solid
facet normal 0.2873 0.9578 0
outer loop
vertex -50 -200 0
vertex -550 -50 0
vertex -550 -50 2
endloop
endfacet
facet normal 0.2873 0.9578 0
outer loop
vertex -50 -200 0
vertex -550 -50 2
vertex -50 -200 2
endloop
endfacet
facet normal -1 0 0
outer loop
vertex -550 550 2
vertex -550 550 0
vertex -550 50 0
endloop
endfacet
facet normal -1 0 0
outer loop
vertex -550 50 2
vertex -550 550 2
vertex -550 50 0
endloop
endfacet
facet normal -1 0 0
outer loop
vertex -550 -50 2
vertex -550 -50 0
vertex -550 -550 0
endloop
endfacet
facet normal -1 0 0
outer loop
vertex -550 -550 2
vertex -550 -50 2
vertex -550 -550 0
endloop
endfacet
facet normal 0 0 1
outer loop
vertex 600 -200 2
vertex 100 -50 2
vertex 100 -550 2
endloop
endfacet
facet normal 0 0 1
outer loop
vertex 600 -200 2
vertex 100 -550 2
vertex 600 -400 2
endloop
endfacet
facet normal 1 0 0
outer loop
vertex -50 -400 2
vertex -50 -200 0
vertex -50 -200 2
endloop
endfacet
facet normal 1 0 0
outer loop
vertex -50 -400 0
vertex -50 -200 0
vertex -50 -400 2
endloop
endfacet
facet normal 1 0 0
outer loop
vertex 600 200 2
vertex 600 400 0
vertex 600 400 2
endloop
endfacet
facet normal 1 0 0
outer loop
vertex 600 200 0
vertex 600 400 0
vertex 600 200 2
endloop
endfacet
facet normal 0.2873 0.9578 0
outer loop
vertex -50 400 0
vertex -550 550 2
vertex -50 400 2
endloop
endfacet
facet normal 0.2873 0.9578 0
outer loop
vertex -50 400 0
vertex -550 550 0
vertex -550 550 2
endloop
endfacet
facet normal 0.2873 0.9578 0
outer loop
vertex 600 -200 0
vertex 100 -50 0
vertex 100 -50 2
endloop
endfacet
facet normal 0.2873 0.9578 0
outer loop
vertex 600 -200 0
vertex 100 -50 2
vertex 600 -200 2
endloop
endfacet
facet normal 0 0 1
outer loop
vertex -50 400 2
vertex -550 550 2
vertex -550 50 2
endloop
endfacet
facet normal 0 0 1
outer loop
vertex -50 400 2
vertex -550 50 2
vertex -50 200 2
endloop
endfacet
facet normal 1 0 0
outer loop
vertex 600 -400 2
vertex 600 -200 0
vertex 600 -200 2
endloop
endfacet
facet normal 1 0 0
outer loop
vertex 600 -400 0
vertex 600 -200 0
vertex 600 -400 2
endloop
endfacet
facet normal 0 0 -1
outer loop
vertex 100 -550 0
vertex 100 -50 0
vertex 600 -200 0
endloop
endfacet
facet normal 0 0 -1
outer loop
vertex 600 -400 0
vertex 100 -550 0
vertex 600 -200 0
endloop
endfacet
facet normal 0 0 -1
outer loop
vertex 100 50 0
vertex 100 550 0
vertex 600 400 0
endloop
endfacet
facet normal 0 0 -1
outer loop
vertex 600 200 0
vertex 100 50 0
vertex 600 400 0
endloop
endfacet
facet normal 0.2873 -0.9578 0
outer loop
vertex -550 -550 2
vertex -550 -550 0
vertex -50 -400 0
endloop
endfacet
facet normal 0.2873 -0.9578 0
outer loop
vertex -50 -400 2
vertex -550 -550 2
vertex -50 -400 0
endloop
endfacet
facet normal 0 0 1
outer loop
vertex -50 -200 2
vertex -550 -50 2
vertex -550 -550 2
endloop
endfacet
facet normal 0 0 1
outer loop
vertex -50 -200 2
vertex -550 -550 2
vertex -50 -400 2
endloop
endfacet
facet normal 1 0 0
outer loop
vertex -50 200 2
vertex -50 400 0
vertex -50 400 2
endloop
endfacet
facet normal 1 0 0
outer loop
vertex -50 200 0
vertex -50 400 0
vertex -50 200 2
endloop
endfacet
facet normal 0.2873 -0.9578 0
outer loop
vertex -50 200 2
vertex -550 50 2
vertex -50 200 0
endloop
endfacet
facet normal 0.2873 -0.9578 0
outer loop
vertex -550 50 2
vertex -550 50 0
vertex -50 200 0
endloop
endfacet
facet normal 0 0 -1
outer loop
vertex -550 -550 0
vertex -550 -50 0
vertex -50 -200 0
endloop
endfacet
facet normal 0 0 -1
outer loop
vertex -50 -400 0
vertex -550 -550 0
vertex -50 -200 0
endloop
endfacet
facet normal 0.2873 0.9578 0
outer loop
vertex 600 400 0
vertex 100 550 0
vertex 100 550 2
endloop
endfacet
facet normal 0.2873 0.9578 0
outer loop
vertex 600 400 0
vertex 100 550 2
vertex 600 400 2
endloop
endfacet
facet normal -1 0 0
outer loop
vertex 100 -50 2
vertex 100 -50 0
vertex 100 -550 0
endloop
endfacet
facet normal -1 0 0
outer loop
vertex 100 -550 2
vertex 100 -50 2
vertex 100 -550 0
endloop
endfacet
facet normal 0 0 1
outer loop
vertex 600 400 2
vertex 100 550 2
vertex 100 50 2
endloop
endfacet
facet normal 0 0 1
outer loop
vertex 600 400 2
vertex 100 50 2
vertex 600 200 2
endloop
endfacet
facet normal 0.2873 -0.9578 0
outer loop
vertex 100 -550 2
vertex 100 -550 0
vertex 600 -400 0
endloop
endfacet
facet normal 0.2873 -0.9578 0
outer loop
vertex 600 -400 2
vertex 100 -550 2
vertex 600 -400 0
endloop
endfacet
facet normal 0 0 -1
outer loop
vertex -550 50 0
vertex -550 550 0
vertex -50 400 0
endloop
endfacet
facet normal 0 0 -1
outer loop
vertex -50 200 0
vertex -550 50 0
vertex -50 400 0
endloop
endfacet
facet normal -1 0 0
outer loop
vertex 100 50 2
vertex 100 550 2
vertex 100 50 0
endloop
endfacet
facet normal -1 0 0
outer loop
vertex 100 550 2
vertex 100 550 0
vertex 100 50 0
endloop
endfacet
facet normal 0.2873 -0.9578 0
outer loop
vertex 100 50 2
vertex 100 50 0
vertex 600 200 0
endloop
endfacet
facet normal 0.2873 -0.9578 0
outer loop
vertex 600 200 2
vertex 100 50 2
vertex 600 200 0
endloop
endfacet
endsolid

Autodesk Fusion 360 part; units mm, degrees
sketch "Sketch1" plane through (0, 0, 0) normal (0, 0, 1) x (1, 0, 0)
  line L0 (-550, 550) -> (-550, 50)
  line L1 (-50, 400) -> (-50, 200)
  line L2 (-550, 550) -> (-50, 400)
  line L3 (-550, 50) -> (-50, 200)
  line L4 (-550, 50) -> (-50, 200)
  line L5 (-50, 400) -> (-50, 200)
  line L6 (-550, 550) -> (-50, 400)
  line L7 (-550, 550) -> (-550, 50)
  line L8 (-550, -50) -> (-550, -550)
  line L9 (-550, -50) -> (-50, -200)
  line L10 (-50, -200) -> (-50, -400)
  line L11 (-550, -550) -> (-50, -400)
  line L12 (100, -50) -> (600, -200)
  line L13 (100, -50) -> (100, -550)
  line L14 (100, -550) -> (600, -400)
  line L15 (600, -200) -> (600, -400)
  line L16 (600, 400) -> (600, 200)
  line L17 (100, 550) -> (600, 400)
  line L18 (100, 50) -> (600, 200)
  line L19 (100, 550) -> (100, 50)
  dimension "d1" = 500
  dimension "d2" = 200
  dimension "d5" = 500
  dimension "d6" = 200
  dimension "d7" = 500
  dimension "d8" = 500
  dimension "d9" = 200
  dimension "d10" = 500
  dimension "d11" = 500
  dimension "d12" = 200
  dimension "d13" = 500
  dimension "d14" = 500
  dimension "d15" = 200
extrude "Extrude2" add sketch "Sketch1" along normal blind 2 makes body 1 at (-383.3333, -266.6667, 0) makes body 2 at (266.6667, -266.6667, 0) makes body 3 at (-383.3333, 333.3333, 0) makes body 4 at (266.6667, 333.3333, 0)
extrude "Extrude1" [suppressed]
